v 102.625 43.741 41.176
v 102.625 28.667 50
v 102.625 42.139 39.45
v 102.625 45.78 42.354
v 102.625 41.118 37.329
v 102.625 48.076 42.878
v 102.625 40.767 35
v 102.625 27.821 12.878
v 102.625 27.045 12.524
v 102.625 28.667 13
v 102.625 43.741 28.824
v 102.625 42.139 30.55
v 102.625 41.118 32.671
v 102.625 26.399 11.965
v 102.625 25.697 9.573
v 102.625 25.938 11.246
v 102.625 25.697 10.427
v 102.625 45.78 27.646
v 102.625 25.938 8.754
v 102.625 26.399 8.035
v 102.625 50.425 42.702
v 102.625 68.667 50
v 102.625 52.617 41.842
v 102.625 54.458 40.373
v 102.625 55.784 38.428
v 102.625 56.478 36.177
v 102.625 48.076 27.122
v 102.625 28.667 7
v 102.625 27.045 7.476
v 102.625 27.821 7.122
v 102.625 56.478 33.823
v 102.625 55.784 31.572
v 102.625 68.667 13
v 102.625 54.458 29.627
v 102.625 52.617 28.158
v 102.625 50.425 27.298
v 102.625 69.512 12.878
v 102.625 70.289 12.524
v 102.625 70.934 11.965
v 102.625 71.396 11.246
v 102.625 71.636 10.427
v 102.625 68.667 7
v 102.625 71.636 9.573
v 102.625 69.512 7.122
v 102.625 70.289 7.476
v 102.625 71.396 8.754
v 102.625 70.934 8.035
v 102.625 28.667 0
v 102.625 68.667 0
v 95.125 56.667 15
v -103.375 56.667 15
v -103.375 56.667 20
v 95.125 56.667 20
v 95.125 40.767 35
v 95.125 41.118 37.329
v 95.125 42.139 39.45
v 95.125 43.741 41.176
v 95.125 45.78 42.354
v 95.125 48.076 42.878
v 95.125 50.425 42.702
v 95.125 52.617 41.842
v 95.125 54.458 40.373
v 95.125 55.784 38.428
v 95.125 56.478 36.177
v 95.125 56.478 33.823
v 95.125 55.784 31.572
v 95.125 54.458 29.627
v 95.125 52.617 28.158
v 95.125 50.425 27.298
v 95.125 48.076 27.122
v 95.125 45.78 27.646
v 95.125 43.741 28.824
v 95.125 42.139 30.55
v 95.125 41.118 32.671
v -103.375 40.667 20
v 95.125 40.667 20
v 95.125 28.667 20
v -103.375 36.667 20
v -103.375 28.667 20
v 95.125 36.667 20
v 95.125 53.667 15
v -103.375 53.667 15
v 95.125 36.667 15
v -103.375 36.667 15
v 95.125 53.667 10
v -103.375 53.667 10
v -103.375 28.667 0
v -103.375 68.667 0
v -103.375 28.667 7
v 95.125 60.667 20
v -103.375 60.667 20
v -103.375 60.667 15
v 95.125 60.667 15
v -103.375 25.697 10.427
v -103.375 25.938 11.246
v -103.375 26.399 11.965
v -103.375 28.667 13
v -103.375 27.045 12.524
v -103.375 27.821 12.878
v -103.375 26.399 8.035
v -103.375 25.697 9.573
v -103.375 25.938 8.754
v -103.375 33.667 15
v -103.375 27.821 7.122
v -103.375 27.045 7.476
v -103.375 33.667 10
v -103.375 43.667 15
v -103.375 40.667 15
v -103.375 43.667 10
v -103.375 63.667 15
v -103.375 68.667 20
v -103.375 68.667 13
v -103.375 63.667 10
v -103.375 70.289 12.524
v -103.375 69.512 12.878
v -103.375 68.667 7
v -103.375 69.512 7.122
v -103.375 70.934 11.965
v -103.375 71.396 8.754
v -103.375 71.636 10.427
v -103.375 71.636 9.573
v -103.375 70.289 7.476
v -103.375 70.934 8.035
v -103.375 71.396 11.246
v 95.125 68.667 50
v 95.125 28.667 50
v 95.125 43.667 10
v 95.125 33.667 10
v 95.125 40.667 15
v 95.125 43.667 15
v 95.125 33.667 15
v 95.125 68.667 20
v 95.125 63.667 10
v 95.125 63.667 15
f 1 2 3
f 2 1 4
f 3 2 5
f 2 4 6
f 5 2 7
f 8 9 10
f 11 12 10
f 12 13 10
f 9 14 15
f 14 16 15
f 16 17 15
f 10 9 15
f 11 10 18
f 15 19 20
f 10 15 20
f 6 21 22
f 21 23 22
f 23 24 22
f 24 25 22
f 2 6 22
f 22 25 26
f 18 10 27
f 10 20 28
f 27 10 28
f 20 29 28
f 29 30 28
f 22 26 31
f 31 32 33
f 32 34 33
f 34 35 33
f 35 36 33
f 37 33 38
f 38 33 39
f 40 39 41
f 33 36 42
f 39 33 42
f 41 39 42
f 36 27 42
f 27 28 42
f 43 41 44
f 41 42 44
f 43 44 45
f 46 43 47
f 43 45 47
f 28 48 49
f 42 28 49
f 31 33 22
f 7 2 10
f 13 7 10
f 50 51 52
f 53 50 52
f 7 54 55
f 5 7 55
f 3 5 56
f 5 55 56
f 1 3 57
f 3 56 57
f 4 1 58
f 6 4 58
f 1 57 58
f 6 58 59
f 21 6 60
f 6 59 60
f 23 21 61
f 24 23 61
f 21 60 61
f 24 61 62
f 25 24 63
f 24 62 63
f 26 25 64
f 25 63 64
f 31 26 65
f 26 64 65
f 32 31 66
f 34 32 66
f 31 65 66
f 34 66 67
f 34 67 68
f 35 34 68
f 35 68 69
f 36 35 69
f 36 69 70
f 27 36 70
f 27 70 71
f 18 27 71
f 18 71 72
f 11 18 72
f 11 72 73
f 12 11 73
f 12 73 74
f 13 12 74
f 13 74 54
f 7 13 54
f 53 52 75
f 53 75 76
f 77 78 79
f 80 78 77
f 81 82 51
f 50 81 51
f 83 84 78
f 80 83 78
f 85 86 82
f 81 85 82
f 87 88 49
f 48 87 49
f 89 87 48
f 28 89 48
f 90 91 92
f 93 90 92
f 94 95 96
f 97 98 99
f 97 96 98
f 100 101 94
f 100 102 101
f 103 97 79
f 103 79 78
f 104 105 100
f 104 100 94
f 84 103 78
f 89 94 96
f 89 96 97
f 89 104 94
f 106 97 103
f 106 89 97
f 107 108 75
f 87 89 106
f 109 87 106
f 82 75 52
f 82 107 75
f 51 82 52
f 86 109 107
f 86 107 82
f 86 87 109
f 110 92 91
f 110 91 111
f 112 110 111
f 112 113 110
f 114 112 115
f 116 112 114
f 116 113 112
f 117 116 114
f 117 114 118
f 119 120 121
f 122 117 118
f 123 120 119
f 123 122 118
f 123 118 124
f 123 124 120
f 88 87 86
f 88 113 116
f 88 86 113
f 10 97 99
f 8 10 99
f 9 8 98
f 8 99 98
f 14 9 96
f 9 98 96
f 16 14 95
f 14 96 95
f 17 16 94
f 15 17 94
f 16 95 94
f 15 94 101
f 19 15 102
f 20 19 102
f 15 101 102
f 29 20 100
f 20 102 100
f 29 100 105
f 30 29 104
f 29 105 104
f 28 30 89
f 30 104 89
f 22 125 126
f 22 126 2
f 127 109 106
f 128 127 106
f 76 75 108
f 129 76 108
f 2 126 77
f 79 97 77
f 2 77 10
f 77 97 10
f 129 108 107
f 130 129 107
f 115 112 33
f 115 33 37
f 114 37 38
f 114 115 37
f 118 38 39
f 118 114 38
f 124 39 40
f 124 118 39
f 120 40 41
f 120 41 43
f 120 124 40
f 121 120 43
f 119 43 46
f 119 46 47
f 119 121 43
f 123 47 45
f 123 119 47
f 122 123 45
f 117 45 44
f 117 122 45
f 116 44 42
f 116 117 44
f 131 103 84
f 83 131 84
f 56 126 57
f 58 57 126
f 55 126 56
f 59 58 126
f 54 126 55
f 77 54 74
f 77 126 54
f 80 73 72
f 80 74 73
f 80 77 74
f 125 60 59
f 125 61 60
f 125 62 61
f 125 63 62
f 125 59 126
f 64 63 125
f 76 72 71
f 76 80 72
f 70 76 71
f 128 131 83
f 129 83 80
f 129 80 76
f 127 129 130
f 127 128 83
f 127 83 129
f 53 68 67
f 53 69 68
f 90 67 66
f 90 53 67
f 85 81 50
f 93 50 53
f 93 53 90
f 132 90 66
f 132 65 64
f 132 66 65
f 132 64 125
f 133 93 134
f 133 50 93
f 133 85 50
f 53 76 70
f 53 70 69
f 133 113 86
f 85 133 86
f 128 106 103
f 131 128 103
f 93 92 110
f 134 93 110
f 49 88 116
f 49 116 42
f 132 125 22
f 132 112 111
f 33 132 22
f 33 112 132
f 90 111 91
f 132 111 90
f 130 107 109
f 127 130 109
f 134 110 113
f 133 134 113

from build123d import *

# Parameters (mm, degrees)
SKETCH1_W           = 206
SKETCH1_H           = 40
BOSS_EXTRUDE1_DEPTH = 20
SKETCH2_W           = 7.5
SKETCH2_H           = 40
BOSS_EXTRUDE2_DEPTH = 30
BOSS_EXTRUDE3_DEPTH = 206
CUT_EXTRUDE1_DEPTH  = 198.5
SKETCH7_R           = 7.9
CUT_EXTRUDE2_DEPTH  = 217.883289147


with BuildPart() as part:
    # Sketch1 → Boss-Extrude1 (new body)
    with BuildSketch(Plane.XY):
        with Locations((-0.375227687, 48.666666667)):
            Rectangle(SKETCH1_W, SKETCH1_H)
    extrude(amount=BOSS_EXTRUDE1_DEPTH)

    # Sketch2 → Boss-Extrude2 (add)
    with BuildSketch(Plane.XY.offset(20)):
        with Locations((98.874772313, 48.666666667)):
            Rectangle(SKETCH2_W, SKETCH2_H)
    extrude(amount=BOSS_EXTRUDE2_DEPTH)

    # Sketch4 → Boss-Extrude3 (add)
    with BuildSketch(Plane.ZY.offset(103.375227687)):
        with BuildLine():
            Line((7, 68.666666667), (13, 68.666666667))
            ThreePointArc((13, 68.666666667), (10, 71.666666667), (7, 68.666666667))
        make_face()
        with BuildLine():
            Line((7, 28.666666667), (13, 28.666666667))
            ThreePointArc((13, 28.666666667), (10, 25.666666667), (7, 28.666666667))
        make_face()
    extrude(amount=-BOSS_EXTRUDE3_DEPTH)

    # Sketch6 → Cut-Extrude1 (cut)
    with BuildSketch(Plane.ZY.offset(103.375227687)):
        Polygon((20, 56.666666667), (20, 60.666666667), (15, 60.666666667), (15, 63.666666667), (10, 63.666666667), (10, 53.666666667), (15, 53.666666667), (15, 56.666666667), align=None)
        Polygon((20, 36.666666667), (20, 40.666666667), (15, 40.666666667), (15, 43.666666667), (10, 43.666666667), (10, 33.666666667), (15, 33.666666667), (15, 36.666666667), align=None)
    extrude(amount=-CUT_EXTRUDE1_DEPTH, mode=Mode.SUBTRACT)

    # Sketch7 → Cut-Extrude2 (cut, through all)
    with BuildSketch(Plane.ZY.offset(-95.124772313)):
        with Locations(Location((35, 48.666666667, 0), (0, 0, 270))):
            Circle(SKETCH7_R)
    extrude(amount=-CUT_EXTRUDE2_DEPTH, mode=Mode.SUBTRACT)


solid = part.part
